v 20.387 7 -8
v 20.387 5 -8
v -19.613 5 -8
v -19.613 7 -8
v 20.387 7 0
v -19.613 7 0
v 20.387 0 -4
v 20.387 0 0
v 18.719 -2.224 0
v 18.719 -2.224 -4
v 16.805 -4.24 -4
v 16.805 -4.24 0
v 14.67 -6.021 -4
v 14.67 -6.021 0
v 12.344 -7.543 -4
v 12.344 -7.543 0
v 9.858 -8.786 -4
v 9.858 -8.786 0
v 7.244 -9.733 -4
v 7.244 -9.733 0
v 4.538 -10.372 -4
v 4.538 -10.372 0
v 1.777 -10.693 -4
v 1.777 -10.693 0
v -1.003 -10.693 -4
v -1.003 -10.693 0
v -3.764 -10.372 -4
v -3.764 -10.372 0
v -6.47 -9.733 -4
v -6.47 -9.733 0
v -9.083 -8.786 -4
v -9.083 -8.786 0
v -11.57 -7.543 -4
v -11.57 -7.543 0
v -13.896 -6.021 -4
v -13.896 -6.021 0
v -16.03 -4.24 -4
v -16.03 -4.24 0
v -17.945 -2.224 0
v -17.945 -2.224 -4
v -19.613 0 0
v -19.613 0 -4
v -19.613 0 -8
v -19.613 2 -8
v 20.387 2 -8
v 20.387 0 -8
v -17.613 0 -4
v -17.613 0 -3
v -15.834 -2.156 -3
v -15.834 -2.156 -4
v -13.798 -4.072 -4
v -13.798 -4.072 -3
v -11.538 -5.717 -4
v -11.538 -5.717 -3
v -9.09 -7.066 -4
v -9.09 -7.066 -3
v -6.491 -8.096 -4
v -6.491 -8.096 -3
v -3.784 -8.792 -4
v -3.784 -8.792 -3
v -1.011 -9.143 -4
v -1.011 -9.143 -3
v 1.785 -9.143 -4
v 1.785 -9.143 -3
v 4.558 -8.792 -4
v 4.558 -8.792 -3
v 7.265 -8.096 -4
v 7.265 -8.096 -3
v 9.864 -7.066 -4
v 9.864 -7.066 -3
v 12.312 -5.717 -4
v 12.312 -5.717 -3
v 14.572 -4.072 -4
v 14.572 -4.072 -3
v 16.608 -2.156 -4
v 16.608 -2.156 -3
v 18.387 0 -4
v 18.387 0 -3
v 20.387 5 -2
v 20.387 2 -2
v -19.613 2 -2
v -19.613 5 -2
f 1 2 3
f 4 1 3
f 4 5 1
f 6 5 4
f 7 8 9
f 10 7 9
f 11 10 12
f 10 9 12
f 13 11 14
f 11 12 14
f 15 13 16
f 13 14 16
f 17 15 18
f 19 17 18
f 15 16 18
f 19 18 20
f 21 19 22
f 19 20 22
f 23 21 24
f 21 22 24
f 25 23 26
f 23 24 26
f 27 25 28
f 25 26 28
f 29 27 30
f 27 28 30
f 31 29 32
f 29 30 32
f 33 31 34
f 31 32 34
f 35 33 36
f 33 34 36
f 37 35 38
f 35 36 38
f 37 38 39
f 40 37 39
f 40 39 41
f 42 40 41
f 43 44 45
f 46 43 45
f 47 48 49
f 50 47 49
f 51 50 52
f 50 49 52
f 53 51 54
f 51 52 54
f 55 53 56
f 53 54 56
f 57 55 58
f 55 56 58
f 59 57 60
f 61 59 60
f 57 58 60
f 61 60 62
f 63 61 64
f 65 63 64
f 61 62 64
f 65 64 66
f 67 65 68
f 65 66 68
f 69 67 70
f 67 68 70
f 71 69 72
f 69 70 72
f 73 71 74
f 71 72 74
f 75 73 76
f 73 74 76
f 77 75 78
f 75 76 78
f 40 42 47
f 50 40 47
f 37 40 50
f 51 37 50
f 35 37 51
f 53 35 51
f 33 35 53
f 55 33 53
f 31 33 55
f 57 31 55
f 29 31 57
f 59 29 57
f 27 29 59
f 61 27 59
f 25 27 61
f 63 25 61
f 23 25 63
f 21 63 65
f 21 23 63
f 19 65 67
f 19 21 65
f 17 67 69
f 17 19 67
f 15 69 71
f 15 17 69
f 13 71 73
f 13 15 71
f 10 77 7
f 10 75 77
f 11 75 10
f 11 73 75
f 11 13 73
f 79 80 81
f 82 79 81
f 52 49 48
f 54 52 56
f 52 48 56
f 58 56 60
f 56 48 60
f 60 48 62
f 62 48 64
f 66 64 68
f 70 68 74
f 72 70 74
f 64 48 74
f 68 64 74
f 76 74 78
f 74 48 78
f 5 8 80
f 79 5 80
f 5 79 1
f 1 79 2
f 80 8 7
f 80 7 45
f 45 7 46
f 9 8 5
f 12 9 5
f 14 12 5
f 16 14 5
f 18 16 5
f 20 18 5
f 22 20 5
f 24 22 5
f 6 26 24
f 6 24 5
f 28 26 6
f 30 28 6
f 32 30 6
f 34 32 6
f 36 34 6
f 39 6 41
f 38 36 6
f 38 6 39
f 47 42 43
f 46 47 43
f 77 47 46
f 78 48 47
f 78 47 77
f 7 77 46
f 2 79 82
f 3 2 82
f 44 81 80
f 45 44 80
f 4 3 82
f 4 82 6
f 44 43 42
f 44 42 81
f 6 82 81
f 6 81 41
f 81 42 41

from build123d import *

# Parameters (mm, degrees)
F0_W     = 40
F0_H     = 2
F1_DEPTH = 8
F2_DEPTH = 3
F4_DEPTH = 1
F5_W     = 40
F5_H     = 2
F6_DEPTH = 3
F7_W     = 40
F7_H     = 6
F7_H_2   = 2
F8_DEPTH = 2


with BuildPart() as f1:
    # F0 (on Top) → F1 (new body)
    with BuildSketch(Plane.XY):
        with Locations((0.387097, 1)):
            Rectangle(F0_W, F0_H)
    extrude(amount=-F1_DEPTH)

    # F0 (on Top) → F2 (join)
    with BuildSketch(Plane.XY):
        with BuildLine():
            Line((20.387097, 0), (-19.612903, 0))
            ThreePointArc((-19.612903, 0), (0.387097, -10.733501), (20.387097, 0))
        make_face()
    extrude(amount=-F2_DEPTH)

    # F3 (on face) → F4 (join)
    with BuildSketch(Plane(origin=(0, 0, -3), x_dir=(1, 0, 0), z_dir=(0, 0, -1))):
        with BuildLine():
            Line((18.387097, 0), (20.387097, 0))
            ThreePointArc((20.387097, 0), (0.387097, 10.733501), (-19.612903, 0))
            Line((-19.612903, 0), (-17.612903, 0))
            ThreePointArc((-17.612903, 0), (0.387097, 9.187189), (18.387097, 0))
        make_face()
    extrude(amount=F4_DEPTH)

    # F5 (on face) → F6 (join)
    with BuildSketch(Plane(origin=(0, 2, 0), x_dir=(-1, 0, 0), z_dir=(0, 1, 0))):
        with Locations((-0.387097, -1)):
            Rectangle(F5_W, F5_H)
    extrude(amount=F6_DEPTH)

    # F7 (on face) → F8 (join)
    with BuildSketch(Plane(origin=(0, 5, 0), x_dir=(-1, 0, 0), z_dir=(0, 1, 0))):
        with Locations((-0.387097, -5)):
            Rectangle(F7_W, F7_H)
        with Locations((-0.387097, -1)):
            Rectangle(F7_W, F7_H_2)
    extrude(amount=F8_DEPTH)


solid = f1.part
